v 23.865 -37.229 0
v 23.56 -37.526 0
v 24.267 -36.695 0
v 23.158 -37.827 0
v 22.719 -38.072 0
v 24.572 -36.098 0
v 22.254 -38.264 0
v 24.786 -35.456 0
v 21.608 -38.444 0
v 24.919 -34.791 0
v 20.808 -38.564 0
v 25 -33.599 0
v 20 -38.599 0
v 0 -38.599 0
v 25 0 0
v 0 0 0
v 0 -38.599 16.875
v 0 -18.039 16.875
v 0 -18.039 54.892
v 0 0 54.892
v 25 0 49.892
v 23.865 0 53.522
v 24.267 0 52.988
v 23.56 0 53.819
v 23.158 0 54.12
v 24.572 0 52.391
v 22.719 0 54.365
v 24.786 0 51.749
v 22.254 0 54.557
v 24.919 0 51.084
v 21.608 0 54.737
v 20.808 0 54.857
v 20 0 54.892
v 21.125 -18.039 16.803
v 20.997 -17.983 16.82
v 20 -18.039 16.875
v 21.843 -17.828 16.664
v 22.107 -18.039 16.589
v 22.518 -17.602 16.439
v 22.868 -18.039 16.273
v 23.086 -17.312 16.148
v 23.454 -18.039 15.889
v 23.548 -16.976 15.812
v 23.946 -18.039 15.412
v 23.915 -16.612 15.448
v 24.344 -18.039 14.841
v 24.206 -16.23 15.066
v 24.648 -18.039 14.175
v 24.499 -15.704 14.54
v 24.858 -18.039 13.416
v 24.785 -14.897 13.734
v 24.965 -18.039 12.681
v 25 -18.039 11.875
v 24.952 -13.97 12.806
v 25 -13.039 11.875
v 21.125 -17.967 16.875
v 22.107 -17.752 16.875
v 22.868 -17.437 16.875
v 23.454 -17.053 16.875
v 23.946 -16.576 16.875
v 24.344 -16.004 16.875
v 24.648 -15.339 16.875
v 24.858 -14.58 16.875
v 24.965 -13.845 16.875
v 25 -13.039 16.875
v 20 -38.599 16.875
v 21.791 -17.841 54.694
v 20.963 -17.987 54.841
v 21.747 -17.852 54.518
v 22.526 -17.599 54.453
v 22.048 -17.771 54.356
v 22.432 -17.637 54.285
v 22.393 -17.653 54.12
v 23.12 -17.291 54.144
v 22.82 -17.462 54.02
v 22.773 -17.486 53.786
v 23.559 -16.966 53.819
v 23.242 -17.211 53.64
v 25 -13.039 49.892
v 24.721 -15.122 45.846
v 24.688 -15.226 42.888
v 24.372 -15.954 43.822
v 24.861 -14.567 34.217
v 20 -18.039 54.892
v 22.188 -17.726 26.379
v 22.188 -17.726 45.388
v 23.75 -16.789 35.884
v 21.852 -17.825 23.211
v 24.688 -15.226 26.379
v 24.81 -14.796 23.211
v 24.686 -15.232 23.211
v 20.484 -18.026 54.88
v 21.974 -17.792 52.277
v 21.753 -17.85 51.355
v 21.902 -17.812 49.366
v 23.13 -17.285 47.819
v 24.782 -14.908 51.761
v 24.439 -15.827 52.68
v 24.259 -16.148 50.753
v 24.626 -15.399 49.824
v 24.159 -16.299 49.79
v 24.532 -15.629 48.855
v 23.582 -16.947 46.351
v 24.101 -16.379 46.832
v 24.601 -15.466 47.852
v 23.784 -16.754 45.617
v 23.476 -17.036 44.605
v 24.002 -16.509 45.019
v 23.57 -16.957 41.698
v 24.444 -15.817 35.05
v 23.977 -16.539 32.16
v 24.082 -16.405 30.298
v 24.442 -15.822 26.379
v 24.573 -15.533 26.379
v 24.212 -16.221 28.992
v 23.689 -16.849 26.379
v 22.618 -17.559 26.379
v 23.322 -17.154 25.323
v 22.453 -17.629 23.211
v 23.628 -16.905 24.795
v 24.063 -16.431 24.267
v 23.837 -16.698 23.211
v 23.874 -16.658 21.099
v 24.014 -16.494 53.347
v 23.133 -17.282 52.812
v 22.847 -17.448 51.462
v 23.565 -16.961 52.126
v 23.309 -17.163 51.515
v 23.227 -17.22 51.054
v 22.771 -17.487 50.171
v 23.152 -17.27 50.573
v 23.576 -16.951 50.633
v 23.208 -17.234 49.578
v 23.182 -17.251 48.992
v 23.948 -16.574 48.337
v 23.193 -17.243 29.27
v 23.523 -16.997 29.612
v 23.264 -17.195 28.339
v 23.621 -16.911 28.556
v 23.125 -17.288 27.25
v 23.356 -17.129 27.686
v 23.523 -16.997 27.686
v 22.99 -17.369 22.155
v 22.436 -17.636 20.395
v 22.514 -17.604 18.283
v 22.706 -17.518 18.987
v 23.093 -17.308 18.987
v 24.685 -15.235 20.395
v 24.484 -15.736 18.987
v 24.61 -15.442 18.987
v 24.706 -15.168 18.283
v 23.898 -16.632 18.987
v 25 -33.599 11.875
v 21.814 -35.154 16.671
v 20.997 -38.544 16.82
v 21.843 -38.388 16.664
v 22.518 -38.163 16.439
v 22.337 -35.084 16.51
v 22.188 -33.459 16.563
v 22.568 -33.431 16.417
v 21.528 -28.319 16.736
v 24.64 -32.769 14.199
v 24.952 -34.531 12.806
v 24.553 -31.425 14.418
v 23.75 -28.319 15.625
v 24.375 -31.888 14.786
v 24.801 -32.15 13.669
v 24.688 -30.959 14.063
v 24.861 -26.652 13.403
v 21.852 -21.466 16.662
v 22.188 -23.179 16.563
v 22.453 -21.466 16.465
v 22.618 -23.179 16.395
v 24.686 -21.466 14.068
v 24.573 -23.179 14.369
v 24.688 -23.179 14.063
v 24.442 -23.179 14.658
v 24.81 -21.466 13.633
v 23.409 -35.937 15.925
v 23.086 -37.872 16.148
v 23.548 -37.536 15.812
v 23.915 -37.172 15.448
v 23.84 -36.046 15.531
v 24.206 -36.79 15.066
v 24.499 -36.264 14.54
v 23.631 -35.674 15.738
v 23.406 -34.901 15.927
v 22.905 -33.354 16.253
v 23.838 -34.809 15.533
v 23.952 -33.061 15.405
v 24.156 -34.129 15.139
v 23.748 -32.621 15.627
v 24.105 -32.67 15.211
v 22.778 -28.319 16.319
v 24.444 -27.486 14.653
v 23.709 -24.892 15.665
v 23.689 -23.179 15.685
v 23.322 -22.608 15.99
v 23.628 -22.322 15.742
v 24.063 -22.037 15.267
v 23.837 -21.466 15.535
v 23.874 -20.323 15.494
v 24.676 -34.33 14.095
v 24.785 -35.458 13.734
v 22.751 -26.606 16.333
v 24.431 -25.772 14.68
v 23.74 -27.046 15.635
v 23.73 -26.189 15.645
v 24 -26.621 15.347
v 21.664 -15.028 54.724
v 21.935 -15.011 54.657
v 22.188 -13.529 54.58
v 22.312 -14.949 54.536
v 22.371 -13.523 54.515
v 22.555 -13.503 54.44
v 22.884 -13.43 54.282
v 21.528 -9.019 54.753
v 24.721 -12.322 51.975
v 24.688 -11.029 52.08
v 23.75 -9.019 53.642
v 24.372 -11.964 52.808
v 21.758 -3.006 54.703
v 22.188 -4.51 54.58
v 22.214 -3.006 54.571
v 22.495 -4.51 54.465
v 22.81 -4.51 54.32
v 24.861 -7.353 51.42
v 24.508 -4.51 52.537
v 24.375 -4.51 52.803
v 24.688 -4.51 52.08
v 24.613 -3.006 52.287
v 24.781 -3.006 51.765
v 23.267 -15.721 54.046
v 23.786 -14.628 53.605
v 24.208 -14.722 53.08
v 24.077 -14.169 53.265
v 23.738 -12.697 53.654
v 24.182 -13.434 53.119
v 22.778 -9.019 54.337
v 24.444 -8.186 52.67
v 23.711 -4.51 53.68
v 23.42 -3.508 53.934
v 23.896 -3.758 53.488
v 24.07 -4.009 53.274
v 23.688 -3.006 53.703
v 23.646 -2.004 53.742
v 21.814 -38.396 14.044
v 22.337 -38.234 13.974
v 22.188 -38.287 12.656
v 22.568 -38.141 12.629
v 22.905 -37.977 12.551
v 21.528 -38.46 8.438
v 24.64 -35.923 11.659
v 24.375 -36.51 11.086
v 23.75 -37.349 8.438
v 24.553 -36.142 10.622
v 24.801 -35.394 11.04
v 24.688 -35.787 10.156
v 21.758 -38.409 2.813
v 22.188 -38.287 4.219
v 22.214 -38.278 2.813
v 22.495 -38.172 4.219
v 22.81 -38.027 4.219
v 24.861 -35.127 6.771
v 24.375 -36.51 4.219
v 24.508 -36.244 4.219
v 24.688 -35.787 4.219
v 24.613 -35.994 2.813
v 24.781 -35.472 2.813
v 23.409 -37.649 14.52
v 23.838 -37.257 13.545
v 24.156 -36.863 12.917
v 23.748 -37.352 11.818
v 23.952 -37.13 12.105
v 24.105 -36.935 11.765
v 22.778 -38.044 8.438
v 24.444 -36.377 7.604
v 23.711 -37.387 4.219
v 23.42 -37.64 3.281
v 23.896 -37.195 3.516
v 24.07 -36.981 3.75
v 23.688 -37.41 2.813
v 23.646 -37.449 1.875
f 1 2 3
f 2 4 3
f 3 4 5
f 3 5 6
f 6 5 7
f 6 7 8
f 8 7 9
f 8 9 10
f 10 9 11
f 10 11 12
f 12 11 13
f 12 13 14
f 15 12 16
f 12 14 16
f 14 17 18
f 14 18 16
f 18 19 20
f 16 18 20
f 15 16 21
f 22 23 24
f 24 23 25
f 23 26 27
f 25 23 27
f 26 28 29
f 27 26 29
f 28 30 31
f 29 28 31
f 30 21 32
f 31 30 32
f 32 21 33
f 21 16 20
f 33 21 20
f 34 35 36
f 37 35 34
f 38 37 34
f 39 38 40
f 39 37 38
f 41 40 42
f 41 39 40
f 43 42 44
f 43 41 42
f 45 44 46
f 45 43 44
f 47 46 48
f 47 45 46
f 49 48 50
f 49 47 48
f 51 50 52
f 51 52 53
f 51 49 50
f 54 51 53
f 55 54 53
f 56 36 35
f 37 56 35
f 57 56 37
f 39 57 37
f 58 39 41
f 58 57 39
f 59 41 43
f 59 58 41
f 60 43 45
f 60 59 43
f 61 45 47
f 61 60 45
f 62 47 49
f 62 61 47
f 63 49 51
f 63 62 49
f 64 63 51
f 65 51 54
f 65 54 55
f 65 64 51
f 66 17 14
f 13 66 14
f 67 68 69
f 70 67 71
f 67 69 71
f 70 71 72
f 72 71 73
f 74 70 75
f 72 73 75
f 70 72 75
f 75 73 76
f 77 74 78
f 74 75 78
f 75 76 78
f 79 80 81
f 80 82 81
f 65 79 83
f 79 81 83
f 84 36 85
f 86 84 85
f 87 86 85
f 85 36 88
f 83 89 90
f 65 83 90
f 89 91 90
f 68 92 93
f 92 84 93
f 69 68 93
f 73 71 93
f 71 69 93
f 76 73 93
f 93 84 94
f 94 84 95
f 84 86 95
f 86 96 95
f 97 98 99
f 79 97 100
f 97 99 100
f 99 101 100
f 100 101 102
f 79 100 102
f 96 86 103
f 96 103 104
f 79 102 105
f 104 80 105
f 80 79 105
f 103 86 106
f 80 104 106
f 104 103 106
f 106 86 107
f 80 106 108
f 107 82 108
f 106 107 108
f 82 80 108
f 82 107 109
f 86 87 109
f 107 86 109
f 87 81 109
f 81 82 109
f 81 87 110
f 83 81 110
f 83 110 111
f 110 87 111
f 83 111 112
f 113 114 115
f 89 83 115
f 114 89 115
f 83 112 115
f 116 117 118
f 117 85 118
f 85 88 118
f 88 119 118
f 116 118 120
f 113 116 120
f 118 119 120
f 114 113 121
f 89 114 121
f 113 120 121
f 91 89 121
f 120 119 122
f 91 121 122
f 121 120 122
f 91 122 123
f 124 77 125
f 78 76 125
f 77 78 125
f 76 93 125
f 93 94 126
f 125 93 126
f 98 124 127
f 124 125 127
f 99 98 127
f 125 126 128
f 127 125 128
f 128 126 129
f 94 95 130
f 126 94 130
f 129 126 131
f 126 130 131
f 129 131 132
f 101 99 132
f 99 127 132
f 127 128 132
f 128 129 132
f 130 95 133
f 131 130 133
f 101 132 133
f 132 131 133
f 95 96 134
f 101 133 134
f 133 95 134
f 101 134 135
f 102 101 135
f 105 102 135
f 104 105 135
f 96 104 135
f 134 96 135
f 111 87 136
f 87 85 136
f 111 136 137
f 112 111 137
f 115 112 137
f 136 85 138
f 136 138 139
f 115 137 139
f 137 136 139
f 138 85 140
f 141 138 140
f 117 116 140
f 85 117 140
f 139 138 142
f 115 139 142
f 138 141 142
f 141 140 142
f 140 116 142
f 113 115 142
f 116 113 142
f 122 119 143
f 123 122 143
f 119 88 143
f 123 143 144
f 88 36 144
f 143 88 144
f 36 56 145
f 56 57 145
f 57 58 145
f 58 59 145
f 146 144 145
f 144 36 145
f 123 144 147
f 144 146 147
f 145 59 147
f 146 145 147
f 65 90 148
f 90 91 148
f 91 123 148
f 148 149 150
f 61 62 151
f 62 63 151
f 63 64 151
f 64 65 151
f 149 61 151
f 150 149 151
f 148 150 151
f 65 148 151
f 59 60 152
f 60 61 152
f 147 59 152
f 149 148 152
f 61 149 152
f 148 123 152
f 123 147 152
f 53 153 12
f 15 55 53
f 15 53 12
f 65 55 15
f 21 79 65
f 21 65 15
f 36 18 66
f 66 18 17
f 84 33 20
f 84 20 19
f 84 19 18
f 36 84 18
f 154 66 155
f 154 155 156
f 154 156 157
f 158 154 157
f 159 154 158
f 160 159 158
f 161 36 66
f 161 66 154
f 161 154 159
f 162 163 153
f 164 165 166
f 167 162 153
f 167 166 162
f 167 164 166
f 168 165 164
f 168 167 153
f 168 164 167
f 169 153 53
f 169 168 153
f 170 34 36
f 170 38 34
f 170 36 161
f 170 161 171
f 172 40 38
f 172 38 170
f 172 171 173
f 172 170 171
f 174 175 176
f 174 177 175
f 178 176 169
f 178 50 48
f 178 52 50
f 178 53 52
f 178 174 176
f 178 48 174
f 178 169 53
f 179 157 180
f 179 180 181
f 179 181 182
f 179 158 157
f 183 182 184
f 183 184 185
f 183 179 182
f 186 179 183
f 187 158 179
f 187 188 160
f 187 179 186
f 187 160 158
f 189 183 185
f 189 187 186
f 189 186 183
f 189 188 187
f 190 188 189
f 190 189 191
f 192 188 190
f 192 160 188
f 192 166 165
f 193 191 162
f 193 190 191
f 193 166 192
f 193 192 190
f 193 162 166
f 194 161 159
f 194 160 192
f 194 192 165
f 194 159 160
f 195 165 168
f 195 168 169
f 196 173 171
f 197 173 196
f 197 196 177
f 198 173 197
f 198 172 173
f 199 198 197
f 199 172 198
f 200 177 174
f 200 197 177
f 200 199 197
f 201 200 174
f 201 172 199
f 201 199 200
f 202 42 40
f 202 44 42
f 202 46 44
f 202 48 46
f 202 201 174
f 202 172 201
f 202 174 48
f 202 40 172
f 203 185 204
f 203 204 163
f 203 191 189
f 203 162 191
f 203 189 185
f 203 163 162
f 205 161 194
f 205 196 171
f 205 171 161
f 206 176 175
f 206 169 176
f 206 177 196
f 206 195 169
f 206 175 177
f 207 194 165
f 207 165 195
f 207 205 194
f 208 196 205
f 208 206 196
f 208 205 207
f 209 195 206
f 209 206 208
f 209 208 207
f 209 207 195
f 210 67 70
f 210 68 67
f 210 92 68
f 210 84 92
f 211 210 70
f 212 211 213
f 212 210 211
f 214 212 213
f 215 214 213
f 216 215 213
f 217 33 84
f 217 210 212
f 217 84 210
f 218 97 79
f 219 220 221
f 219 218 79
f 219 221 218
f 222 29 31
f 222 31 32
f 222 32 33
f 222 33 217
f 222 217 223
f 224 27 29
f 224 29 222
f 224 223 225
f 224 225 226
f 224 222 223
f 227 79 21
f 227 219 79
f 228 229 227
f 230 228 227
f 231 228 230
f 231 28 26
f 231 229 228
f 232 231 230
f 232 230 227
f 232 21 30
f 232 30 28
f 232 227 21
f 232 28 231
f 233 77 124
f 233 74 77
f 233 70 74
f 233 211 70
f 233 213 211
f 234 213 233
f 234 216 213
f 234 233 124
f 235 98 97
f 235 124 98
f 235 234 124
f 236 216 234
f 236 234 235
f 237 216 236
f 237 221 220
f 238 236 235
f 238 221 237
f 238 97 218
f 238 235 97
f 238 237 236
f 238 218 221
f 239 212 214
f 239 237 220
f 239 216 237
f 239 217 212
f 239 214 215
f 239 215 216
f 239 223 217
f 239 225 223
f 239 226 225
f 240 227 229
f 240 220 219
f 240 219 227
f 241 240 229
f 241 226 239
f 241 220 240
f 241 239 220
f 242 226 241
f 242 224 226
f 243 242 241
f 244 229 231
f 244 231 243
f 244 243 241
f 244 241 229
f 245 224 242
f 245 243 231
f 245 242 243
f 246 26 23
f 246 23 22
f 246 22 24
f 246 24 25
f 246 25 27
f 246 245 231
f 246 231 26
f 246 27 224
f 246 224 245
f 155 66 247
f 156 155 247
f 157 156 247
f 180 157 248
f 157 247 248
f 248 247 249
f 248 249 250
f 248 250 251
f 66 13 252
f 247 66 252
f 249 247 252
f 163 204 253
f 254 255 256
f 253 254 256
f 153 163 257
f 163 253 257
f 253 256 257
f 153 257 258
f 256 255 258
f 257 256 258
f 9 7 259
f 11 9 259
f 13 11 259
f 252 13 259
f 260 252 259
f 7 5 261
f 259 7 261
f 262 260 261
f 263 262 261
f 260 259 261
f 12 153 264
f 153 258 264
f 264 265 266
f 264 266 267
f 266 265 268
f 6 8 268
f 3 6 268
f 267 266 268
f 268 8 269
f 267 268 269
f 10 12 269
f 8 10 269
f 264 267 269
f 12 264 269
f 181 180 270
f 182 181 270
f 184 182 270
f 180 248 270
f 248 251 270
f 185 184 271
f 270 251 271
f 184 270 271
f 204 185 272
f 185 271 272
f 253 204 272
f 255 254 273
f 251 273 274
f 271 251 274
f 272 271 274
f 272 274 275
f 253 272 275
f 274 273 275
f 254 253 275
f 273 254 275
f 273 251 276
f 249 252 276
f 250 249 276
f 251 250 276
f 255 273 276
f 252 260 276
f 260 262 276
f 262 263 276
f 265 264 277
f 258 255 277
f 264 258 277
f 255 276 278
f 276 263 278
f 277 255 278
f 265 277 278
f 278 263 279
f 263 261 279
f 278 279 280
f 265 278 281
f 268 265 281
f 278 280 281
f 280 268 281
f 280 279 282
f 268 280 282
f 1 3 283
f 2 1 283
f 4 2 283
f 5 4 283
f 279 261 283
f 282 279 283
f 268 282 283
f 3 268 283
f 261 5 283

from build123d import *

# Parameters (mm, degrees)
F1_DEPTH     = 25
F2_T1_DEPTH  = 50.5172412843
F2_T3_DEPTH  = 43.0387943983
F2_T5_DEPTH  = 33.0603428185
F2_T7_DEPTH  = 41.8750006706
F2_T13_DEPTH = 63.0172412843
F2_T17_DEPTH = 45.5603428185


# Not quite as in the source:
# - a fillet or chamfer that OpenCascade refuses, or shapes differently, is made with other operations: its cross-section is extruded or revolved along the edge and cut away or added


with BuildPart() as f1:
    # F0 (on Right) → F1 (new body)
    with BuildSketch(Plane.YZ):
        Polygon((-38.5991372168, 16.8750006706), (-38.5991372168, 0), (0, 0), (0, 54.8922419548), (-18.0387943983, 54.8922419548), (-18.0387943983, 16.8750006706), align=None)
    extrude(amount=F1_DEPTH)

    # F2: fillet of radius 5 on 4 edges, made by hand

    # F2_s2 → F2_t1 (cut)
    with BuildSketch(Plane.XY.offset(16.8750006706)):
        with BuildLine():
            add(Edge.make_bspline(
                [(20, -18.0387943983), (25, -18.0387943983), (25, -13.0387943983)],
                knots=[0, 0, 0, 1, 1, 1], degree=2, weights=[1, 1, 1]))
            Line((25, -13.0387943983), (25, -18.0387943983))
            Line((25, -18.0387943983), (20, -18.0387943983))
        make_face()
    extrude(amount=F2_T1_DEPTH, mode=Mode.SUBTRACT)

    # F2_s4 → F2_t3 (cut)
    with BuildSketch(Plane.XZ.offset(-12.5)):
        with BuildLine():
            add(Edge.make_bspline(
                [(20, 54.8922419548), (25, 54.8922419548), (25, 49.8922419548)],
                knots=[0, 0, 0, 1, 1, 1], degree=2, weights=[1, 1, 1]))
            Line((25, 49.8922419548), (25, 54.8922419548))
            Line((25, 54.8922419548), (20, 54.8922419548))
        make_face()
    extrude(amount=F2_T3_DEPTH, mode=Mode.SUBTRACT)

    # F2_s6 → F2_t5 (cut)
    with BuildSketch(Plane.XZ.offset(18.0387943983)):
        with BuildLine():
            add(Edge.make_bspline(
                [(20, 16.8750006706), (25, 16.8750006706), (25, 11.8750006706)],
                knots=[0, 0, 0, 1, 1, 1], degree=2, weights=[1, 1, 1]))
            Line((25, 11.8750006706), (25, 16.8750006706))
            Line((25, 16.8750006706), (20, 16.8750006706))
        make_face()
    extrude(amount=F2_T5_DEPTH, mode=Mode.SUBTRACT)

    # F2_s8 → F2_t7 (cut)
    with BuildSketch(Plane.XY.offset(-12.5)):
        with BuildLine():
            add(Edge.make_bspline(
                [(20, -38.5991372168), (25, -38.5991372168), (25, -33.5991372168)],
                knots=[0, 0, 0, 1, 1, 1], degree=2, weights=[1, 1, 1]))
            Line((25, -33.5991372168), (25, -38.5991372168))
            Line((25, -38.5991372168), (20, -38.5991372168))
        make_face()
    extrude(amount=F2_T7_DEPTH, mode=Mode.SUBTRACT)


with BuildPart() as f2_tool11:
    # F2_s12 → F2_t13 (new body)
    with BuildSketch(Plane.XY.offset(67.3922419548)):
        with BuildLine():
            add(Edge.make_bspline(
                [(20, -18.0387943983), (25, -18.0387943983), (25, -13.0387943983)],
                knots=[0, 0, 0, 1, 1, 1], degree=2, weights=[1, 1, 1]))
            Line((25, -13.0387943983), (25, -18.0387943983))
            Line((25, -18.0387943983), (20, -18.0387943983))
        make_face()
    extrude(amount=-F2_T13_DEPTH)

    split(bisect_by=Plane.XY.offset(16.8750006706), keep=Keep.BOTTOM)


with BuildPart() as f2_tool15:
    # F2_s16 → F2_t17 (new body)
    with BuildSketch(Plane.XZ.offset(5.5387943983)):
        with BuildLine():
            add(Edge.make_bspline(
                [(20, 16.8750006706), (25, 16.8750006706), (25, 11.8750006706)],
                knots=[0, 0, 0, 1, 1, 1], degree=2, weights=[1, 1, 1]))
            Line((25, 11.8750006706), (25, 16.8750006706))
            Line((25, 16.8750006706), (20, 16.8750006706))
        make_face()
    extrude(amount=F2_T17_DEPTH)

    split(bisect_by=Plane.XZ.offset(18.0387943983), keep=Keep.BOTTOM)


with BuildPart() as f2_tool11_1:
    add(f2_tool11.part)

    # F2_t19: intersect F2_tool15
    add(f2_tool15.part, mode=Mode.INTERSECT)


with BuildPart() as f1_1:
    add(f1.part)

    # F2_t9: cut F2_tool11
    add(f2_tool11_1.part, mode=Mode.SUBTRACT)


solid = f1_1.part
